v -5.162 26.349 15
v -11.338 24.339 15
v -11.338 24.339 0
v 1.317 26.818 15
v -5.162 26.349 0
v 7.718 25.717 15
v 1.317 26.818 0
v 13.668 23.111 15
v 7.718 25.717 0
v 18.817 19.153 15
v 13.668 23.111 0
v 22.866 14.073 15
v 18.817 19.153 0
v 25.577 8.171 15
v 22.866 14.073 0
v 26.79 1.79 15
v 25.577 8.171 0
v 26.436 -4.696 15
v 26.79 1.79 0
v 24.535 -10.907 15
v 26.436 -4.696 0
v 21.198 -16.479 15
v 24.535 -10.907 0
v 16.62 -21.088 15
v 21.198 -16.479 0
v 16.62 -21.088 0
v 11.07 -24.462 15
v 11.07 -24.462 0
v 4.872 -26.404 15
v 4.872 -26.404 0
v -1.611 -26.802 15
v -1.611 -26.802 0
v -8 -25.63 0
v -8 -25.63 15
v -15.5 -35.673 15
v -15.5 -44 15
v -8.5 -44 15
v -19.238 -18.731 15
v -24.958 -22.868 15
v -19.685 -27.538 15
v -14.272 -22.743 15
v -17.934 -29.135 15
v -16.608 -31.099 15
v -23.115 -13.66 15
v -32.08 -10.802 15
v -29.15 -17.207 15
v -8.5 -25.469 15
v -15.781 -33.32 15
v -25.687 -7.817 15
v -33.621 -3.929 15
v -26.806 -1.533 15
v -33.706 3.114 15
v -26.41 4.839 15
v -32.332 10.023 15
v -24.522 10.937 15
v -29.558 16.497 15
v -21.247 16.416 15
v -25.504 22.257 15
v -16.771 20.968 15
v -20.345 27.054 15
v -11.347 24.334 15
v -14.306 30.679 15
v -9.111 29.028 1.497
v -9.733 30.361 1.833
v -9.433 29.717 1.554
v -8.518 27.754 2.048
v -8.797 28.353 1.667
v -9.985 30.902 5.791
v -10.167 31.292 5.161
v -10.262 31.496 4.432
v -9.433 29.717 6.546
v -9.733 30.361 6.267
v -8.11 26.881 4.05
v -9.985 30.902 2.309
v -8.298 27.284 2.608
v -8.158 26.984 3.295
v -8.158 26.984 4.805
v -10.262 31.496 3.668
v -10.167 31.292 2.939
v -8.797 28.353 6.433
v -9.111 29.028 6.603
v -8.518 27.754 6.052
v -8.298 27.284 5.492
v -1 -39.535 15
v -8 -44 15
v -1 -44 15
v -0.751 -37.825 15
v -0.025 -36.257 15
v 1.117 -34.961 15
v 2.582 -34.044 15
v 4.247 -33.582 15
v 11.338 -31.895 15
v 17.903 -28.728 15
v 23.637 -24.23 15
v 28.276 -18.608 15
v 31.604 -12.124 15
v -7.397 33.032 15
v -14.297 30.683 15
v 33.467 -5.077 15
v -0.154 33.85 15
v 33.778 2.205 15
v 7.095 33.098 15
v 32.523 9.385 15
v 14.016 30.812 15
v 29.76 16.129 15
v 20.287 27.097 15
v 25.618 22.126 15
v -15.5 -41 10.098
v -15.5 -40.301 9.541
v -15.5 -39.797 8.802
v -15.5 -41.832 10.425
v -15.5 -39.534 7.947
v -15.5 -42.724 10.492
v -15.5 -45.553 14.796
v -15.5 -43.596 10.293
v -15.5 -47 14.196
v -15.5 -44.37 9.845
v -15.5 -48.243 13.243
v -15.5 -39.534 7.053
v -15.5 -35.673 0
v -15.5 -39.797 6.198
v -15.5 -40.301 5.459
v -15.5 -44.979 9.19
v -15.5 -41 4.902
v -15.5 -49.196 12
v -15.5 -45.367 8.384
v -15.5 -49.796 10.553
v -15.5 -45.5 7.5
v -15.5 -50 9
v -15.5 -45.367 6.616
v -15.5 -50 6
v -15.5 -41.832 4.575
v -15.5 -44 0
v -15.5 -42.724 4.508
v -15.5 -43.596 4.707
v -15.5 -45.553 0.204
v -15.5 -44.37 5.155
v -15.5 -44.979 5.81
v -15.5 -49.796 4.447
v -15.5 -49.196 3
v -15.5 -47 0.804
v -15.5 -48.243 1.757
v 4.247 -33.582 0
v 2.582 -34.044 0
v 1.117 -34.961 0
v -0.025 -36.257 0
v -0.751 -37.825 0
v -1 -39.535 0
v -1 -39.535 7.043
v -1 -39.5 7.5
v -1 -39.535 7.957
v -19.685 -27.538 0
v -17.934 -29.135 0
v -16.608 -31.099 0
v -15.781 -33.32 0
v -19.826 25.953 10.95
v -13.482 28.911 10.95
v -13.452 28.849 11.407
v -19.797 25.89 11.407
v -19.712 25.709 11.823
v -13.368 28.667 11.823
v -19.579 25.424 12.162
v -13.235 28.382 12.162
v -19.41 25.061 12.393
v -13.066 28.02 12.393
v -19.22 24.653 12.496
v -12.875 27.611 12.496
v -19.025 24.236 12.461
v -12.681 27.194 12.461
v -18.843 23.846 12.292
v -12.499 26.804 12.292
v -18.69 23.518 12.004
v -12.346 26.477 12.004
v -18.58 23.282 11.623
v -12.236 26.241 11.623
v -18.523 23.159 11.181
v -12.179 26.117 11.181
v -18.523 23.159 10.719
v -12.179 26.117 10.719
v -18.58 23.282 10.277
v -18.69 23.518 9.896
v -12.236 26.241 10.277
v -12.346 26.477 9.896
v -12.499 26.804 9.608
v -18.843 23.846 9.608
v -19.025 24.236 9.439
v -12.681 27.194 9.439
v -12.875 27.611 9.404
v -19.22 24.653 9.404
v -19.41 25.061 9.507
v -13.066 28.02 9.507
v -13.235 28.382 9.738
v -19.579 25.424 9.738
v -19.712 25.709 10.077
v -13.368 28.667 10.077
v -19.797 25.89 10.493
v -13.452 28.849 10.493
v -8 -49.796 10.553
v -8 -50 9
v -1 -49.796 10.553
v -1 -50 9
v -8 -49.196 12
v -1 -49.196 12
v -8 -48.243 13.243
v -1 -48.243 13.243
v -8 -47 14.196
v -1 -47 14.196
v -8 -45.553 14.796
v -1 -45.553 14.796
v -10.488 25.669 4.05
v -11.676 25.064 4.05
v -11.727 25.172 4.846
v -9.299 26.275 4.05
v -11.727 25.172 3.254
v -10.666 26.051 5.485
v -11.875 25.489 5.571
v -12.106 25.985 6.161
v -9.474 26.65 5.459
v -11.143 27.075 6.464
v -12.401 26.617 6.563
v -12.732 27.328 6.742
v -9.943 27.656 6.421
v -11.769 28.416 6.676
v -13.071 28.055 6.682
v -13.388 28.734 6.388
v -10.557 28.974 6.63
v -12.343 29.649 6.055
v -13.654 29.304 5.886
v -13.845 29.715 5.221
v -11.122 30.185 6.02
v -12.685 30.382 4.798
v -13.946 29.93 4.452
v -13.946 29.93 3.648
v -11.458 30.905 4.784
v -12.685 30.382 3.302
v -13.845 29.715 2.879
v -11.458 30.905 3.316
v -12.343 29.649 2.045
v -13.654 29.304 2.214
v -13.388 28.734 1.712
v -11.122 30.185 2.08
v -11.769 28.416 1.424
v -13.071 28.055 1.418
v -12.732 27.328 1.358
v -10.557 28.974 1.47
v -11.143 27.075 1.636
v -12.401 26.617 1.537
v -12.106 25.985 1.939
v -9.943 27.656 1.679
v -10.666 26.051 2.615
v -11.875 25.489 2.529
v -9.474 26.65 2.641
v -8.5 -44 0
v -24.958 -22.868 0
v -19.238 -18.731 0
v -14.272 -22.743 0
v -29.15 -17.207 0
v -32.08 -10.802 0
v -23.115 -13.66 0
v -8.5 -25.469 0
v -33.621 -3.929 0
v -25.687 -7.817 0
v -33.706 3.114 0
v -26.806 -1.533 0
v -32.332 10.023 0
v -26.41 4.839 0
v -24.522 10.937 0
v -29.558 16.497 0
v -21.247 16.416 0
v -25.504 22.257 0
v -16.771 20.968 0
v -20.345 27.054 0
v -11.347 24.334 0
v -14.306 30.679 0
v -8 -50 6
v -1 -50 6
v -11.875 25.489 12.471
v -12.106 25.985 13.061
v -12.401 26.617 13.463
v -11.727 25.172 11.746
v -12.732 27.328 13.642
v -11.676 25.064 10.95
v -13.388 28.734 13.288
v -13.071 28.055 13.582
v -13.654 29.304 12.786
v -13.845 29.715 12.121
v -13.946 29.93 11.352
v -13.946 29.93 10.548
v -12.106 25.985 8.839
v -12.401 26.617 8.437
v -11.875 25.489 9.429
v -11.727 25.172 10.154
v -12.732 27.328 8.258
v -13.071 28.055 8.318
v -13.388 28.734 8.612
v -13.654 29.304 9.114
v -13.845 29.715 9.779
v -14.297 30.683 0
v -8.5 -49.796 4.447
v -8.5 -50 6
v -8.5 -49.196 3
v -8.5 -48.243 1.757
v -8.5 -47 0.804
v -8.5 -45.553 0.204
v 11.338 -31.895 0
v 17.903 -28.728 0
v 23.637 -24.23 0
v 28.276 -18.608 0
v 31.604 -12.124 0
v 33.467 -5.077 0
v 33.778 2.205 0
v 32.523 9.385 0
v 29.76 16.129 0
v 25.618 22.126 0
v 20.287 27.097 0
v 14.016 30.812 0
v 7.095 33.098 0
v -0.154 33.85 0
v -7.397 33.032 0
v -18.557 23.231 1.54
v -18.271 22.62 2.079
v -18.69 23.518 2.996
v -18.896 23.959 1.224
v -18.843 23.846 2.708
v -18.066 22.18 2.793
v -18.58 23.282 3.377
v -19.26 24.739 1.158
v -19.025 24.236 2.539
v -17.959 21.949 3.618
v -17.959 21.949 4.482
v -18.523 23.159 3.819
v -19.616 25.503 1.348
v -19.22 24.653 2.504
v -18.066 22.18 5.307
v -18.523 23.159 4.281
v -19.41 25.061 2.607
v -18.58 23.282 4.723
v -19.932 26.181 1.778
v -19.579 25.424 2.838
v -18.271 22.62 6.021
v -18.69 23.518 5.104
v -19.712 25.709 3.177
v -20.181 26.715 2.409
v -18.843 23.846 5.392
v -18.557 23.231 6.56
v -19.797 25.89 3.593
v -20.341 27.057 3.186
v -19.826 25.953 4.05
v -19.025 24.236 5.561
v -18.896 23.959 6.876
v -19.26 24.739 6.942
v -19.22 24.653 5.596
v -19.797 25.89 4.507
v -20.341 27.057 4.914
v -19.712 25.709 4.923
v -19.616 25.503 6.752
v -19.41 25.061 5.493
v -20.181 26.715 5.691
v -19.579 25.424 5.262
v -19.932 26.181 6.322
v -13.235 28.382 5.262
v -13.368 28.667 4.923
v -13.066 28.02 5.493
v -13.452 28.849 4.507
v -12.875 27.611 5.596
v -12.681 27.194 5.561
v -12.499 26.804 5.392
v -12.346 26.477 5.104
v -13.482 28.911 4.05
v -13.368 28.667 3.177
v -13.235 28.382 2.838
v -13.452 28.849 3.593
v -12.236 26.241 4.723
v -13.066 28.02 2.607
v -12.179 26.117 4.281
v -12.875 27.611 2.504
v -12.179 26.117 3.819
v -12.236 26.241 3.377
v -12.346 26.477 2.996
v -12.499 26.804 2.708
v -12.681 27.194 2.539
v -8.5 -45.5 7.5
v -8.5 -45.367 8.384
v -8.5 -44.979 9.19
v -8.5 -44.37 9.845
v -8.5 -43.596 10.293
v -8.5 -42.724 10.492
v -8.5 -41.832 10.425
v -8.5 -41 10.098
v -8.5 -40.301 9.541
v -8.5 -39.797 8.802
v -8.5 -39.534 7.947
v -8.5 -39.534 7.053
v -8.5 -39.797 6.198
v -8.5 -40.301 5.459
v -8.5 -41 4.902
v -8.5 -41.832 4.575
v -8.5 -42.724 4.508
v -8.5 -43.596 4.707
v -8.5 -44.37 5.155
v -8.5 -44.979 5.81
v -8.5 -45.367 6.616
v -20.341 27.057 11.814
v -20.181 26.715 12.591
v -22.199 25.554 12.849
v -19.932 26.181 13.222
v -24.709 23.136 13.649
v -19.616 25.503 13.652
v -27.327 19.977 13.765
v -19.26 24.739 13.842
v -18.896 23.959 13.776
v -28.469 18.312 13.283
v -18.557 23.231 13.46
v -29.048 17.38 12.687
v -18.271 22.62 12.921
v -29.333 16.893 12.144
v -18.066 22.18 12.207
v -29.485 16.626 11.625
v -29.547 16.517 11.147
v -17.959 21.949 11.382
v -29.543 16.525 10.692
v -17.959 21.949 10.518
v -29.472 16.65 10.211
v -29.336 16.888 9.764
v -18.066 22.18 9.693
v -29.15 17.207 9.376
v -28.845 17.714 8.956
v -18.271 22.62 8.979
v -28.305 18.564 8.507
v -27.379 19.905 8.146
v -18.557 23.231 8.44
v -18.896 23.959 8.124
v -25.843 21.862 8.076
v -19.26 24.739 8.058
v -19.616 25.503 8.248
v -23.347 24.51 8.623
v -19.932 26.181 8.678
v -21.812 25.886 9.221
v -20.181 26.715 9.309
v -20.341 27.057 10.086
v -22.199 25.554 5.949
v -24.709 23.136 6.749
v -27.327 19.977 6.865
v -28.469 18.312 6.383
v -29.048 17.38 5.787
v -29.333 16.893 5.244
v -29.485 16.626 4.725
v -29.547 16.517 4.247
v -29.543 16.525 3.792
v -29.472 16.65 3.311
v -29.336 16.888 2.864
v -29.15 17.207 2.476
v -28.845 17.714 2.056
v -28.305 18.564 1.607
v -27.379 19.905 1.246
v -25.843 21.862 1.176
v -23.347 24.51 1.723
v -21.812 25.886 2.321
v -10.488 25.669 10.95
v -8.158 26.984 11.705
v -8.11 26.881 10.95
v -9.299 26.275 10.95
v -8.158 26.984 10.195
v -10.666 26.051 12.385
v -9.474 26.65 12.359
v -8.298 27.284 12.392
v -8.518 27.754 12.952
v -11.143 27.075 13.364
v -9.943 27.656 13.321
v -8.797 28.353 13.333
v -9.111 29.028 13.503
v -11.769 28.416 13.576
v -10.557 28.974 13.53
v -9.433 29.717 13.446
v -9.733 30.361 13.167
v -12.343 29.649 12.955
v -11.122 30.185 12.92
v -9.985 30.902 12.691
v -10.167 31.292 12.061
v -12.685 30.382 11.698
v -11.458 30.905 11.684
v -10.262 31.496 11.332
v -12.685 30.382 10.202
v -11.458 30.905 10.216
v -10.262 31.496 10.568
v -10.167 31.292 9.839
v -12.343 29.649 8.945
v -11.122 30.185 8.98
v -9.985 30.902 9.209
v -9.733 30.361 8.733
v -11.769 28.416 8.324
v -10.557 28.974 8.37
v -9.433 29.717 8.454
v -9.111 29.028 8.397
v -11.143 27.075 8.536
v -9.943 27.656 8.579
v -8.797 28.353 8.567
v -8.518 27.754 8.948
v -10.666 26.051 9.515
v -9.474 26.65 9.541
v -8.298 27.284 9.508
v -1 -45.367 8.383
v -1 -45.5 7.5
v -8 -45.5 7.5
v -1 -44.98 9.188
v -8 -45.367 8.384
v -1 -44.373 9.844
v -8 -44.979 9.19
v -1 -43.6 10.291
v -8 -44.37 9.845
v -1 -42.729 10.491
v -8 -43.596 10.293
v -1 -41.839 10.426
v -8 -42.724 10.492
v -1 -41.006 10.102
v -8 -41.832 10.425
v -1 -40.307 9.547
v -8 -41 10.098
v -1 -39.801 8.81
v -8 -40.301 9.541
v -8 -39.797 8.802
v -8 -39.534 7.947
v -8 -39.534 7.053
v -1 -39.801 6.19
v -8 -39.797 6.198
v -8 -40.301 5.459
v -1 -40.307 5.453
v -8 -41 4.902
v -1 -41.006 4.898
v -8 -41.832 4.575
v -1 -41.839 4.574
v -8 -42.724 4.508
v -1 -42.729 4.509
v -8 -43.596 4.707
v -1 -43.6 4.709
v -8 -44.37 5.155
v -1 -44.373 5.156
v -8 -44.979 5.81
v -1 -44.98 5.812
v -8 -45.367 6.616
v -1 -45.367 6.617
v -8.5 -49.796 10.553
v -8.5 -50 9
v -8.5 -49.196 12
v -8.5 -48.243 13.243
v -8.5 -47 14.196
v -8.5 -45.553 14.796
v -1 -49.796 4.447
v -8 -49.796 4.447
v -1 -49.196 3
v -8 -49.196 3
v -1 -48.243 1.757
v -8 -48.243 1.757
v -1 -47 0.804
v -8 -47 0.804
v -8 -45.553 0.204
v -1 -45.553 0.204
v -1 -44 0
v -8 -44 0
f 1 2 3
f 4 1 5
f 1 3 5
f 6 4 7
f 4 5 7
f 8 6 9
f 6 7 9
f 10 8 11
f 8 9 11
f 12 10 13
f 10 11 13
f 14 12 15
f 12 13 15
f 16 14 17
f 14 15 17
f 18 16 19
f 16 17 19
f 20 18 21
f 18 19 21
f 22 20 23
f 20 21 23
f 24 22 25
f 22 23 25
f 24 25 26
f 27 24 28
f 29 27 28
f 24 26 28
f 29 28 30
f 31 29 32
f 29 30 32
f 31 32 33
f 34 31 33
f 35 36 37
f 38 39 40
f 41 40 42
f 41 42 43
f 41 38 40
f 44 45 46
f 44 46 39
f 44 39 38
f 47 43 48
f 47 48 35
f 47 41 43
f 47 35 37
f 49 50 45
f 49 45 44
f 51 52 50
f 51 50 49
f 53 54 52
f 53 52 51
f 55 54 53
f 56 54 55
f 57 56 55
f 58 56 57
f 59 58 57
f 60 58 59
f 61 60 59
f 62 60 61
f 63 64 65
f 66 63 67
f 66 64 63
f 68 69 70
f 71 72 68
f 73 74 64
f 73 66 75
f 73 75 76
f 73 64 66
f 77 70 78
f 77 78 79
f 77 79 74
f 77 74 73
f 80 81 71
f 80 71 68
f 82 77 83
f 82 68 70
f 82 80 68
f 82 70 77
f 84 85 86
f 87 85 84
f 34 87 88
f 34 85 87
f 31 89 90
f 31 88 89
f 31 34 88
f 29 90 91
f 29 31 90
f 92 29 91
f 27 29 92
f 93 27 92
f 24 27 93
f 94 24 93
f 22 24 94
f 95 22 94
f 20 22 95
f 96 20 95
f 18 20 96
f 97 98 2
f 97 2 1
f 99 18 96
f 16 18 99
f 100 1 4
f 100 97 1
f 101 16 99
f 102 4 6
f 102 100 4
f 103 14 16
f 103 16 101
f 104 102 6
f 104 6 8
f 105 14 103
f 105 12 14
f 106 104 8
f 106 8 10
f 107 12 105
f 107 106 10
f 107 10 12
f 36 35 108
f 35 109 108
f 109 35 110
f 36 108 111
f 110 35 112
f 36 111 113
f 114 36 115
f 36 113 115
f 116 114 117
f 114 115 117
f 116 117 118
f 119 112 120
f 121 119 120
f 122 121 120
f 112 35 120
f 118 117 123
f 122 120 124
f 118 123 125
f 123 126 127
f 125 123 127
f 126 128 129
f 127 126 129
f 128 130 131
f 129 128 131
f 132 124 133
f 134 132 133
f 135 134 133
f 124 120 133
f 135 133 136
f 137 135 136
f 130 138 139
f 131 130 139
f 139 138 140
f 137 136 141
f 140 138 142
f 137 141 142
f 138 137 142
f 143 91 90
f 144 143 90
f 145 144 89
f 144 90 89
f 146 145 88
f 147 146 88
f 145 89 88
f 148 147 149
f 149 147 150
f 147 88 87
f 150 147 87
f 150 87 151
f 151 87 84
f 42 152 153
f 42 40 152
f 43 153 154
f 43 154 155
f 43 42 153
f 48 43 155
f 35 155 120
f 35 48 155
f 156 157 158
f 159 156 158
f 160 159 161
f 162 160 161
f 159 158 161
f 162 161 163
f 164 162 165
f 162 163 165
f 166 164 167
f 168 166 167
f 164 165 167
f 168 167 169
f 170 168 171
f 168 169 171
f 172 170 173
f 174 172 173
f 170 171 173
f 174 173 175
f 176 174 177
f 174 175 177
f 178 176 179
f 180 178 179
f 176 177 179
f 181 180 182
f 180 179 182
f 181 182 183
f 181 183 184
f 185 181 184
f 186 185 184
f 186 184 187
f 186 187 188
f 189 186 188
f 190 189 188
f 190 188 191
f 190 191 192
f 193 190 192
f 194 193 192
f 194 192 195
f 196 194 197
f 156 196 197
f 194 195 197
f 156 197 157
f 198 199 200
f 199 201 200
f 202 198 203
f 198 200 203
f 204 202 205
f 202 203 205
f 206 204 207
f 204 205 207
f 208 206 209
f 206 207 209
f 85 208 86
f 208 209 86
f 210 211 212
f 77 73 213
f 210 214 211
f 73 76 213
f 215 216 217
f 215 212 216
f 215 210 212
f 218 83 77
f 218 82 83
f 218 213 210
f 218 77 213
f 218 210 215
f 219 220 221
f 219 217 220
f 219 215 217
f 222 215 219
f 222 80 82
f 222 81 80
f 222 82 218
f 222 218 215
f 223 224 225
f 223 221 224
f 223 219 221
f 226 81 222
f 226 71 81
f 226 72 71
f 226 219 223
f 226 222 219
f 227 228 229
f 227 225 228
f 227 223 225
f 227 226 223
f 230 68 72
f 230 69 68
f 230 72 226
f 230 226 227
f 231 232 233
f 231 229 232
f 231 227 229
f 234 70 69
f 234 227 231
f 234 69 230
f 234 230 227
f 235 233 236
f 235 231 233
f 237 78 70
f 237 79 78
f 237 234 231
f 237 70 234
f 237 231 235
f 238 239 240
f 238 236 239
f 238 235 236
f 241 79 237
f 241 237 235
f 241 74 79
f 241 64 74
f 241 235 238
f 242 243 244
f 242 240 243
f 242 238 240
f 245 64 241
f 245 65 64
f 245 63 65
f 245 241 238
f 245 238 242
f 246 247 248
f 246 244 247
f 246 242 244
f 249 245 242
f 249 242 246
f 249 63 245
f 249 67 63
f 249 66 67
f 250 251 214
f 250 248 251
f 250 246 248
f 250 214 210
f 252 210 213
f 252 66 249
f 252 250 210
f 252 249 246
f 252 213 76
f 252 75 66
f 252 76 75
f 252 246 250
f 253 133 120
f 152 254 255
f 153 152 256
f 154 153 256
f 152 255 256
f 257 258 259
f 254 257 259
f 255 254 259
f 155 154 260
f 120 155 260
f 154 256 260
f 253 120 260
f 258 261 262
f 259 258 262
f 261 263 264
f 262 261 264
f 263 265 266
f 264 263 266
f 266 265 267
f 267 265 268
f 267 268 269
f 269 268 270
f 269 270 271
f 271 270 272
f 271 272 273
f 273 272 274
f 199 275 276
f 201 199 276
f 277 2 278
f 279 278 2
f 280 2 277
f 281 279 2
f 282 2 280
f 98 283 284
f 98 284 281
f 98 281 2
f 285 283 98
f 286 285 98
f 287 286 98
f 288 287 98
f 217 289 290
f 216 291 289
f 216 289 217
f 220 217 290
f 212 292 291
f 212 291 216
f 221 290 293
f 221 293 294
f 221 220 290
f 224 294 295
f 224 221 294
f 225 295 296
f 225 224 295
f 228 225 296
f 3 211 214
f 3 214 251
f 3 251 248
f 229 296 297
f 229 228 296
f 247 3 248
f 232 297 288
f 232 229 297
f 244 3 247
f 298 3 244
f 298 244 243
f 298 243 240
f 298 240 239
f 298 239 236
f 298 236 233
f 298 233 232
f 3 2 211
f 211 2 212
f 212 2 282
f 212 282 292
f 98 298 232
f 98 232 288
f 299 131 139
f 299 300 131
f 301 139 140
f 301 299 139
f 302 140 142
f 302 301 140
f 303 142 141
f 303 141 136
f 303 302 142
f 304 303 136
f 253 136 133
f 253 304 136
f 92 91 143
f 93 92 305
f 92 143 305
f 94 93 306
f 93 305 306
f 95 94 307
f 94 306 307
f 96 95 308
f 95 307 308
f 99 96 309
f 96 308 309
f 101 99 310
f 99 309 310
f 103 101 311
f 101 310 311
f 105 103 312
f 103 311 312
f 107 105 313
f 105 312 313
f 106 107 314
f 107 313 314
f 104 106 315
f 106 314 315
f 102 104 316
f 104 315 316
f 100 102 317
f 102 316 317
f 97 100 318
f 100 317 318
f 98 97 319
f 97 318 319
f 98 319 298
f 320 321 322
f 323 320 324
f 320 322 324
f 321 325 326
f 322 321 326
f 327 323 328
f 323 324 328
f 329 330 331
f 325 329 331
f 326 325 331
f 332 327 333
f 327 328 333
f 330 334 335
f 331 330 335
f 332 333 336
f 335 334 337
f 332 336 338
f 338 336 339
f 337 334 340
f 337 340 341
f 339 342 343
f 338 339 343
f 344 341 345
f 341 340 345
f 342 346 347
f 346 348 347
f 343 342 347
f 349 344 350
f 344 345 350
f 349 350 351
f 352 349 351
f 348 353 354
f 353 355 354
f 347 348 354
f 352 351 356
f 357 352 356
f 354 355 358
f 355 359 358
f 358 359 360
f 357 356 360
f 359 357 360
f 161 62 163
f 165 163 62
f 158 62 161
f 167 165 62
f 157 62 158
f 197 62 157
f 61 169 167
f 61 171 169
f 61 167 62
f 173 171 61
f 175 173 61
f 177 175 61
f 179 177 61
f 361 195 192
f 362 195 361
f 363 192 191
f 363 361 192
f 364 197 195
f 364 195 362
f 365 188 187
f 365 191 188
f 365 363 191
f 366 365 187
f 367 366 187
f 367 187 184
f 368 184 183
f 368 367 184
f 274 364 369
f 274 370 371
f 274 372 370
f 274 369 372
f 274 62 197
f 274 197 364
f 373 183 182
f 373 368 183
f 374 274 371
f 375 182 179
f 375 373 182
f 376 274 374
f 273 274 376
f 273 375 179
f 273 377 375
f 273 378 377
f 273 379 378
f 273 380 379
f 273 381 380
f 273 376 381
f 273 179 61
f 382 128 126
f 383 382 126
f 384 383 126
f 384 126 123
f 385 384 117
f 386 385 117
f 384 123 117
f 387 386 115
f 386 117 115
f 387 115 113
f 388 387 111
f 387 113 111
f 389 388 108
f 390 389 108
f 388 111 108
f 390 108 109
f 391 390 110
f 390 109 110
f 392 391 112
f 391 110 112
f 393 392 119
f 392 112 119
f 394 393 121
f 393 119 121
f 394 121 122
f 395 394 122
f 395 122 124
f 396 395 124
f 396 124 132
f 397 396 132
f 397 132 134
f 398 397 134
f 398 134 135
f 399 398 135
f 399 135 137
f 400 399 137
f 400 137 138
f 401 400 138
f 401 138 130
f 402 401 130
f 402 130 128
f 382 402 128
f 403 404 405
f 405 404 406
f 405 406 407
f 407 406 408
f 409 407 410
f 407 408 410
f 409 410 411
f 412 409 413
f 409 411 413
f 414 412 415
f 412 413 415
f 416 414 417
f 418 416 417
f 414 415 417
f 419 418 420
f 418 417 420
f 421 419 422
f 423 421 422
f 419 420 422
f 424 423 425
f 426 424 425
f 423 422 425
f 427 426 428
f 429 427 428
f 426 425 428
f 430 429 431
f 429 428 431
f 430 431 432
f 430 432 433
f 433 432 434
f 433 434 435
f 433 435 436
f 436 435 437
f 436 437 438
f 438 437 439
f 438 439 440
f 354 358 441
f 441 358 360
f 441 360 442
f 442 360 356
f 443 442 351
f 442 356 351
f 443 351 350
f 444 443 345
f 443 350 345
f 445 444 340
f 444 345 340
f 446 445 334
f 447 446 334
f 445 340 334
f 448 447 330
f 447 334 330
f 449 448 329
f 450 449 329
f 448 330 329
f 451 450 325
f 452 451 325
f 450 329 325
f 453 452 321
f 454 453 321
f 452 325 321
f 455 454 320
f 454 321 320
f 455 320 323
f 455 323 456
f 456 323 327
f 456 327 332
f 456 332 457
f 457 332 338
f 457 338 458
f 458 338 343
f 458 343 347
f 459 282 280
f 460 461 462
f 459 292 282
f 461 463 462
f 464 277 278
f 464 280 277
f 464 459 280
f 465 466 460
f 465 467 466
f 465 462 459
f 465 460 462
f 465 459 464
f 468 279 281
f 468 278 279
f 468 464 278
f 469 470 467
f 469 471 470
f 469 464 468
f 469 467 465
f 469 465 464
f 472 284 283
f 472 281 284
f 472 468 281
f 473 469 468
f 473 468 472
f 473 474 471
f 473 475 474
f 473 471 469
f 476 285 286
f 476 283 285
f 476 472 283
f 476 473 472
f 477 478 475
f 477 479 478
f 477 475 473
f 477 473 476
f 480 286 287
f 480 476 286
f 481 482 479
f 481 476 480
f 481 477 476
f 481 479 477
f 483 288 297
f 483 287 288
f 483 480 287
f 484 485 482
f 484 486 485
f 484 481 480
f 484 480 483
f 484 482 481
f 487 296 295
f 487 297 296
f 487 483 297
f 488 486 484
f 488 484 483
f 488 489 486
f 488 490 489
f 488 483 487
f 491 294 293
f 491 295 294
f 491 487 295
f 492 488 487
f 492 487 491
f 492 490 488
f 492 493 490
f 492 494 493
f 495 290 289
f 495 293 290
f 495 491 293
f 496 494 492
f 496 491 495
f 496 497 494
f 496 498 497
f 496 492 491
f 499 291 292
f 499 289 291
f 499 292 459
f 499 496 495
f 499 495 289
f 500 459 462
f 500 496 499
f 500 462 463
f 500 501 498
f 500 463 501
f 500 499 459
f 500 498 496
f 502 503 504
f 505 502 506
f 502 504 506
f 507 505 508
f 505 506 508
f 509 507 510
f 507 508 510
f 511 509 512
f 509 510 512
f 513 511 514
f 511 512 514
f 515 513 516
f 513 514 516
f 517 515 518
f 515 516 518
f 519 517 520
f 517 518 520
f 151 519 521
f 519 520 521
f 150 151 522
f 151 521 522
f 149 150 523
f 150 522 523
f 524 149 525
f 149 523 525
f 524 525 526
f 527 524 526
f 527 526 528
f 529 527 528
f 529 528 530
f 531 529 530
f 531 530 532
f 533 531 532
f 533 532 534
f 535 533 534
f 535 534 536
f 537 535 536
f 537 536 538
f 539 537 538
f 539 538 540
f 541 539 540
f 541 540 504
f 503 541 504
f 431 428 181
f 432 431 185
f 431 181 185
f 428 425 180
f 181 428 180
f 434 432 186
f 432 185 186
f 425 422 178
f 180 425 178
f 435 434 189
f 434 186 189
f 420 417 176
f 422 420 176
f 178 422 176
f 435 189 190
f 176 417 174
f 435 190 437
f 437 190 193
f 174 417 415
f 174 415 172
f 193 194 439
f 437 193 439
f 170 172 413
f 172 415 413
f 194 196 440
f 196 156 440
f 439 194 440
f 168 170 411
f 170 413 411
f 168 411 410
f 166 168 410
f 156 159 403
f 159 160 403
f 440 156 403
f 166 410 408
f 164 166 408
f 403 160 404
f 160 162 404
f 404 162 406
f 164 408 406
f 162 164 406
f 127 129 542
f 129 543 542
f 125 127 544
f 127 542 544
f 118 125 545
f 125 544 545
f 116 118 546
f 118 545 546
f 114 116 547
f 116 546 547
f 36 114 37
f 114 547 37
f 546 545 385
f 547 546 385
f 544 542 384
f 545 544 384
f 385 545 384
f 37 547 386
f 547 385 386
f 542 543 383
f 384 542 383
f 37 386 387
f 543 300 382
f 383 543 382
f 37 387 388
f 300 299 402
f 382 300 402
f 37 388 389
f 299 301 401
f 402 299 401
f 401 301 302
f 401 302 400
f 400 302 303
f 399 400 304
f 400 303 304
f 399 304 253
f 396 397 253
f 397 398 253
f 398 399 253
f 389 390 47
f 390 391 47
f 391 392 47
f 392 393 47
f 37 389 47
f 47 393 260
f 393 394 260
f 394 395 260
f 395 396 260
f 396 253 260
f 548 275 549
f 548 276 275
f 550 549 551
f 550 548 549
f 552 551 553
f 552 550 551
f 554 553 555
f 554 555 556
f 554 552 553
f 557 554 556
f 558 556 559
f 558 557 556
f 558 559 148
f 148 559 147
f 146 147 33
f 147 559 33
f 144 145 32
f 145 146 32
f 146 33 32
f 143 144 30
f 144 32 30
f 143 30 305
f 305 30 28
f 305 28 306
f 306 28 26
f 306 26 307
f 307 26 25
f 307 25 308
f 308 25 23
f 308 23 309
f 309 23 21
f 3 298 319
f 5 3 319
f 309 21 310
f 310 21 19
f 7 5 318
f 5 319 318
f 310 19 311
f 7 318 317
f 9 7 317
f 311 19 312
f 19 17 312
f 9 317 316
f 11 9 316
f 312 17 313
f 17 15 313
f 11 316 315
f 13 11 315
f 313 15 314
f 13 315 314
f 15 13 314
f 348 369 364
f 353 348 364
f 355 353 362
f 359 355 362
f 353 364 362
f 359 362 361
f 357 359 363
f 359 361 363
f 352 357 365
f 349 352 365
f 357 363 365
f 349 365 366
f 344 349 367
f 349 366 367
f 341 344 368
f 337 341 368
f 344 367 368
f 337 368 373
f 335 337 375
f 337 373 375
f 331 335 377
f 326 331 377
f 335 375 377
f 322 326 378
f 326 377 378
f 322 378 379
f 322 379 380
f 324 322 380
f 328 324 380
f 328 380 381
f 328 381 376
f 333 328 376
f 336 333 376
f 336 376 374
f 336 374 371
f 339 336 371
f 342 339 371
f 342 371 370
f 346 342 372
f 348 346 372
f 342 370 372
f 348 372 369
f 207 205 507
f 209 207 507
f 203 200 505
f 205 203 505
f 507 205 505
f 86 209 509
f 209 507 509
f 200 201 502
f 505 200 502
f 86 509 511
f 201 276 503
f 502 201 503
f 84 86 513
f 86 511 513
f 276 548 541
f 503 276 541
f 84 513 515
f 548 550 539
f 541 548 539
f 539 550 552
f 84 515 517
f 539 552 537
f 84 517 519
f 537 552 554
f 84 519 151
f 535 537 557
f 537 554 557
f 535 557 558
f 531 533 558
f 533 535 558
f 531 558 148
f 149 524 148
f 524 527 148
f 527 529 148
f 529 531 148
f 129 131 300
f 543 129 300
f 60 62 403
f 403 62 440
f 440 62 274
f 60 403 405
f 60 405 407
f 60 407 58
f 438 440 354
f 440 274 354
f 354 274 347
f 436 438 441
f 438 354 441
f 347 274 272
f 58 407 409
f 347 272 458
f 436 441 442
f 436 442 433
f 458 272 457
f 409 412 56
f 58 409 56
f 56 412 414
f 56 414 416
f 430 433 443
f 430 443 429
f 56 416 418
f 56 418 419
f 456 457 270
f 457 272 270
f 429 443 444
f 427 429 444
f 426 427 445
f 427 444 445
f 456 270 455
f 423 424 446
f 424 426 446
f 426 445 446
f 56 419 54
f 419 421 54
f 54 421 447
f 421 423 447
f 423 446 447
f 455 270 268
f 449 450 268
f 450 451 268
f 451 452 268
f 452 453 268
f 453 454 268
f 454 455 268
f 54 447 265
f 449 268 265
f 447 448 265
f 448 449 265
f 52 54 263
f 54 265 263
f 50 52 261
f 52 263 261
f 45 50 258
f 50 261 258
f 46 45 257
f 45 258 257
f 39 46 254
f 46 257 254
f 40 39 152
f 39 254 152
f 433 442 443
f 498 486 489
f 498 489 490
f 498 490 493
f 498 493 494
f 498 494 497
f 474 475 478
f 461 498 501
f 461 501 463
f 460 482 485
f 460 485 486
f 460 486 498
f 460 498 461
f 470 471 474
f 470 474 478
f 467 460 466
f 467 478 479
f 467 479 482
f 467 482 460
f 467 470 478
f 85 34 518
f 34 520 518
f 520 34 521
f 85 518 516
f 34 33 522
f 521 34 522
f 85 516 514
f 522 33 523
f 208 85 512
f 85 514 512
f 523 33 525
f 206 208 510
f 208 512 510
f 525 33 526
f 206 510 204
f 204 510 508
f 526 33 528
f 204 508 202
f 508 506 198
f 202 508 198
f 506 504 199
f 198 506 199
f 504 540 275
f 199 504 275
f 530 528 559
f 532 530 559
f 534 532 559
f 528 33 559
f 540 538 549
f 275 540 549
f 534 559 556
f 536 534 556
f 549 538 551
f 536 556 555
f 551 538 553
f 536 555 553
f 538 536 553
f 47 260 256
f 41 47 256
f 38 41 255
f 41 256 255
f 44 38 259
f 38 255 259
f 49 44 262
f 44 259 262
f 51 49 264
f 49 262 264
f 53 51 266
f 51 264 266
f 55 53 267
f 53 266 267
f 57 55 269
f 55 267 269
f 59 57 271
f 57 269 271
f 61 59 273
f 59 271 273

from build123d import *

# Parameters (mm, degrees)
F1_DEPTH       = 15
F2_R           = 6
F3_R           = 10
F4_R           = 6
F5_R           = 3
F6_DEPTH       = 49.351
F8_DEPTH       = 15.0010001
F9_R           = 1.55
F10_DEPTH      = 7
F10_DEPTH_BACK = 3.8
F11_R          = 2.7
F12_DEPTH      = 4
F12_TAPER      = 2
F13_R          = 2.9
F14_DEPTH      = 44.8104316782


with BuildPart() as f1:
    # F0 (on Top) → F1 (new body)
    with BuildSketch(Plane.XY):
        with BuildLine():
            Line((-1, -50), (-1, -33.835225727))
            ThreePointArc((-1, -33.835225727), (8.4595546822, 32.7758819039), (-15.5, -30.0927316806))
            Line((-15.5, -30.0927316806), (-15.5, -50))
            Line((-15.5, -50), (-8.5, -50))
            Line((-8.5, -50), (-8.5, -25.4690498449))
            ThreePointArc((-8.5, -25.4690498449), (8.2503949294, 25.5509977009), (-8, -25.6304994099))
            Line((-8, -25.6304994099), (-8, -50))
            Line((-8, -50), (-1, -50))
        make_face()
    extrude(amount=F1_DEPTH)

    # F2
    f2_edges = [f1.edges().sort_by_distance(p)[0] for p in [
        (-12, -50, 15),
        (-4.5, -50, 15),
        (-12, -50, 0),
        (-4.5, -50, 0),
    ]]
    fillet(f2_edges, radius=F2_R)

    # F3
    f3_edges = [f1.edges().sort_by_distance(p)[0] for p in [
        (-15.5, -30.092732, 7.5),
    ]]
    fillet(f3_edges, radius=F3_R)

    # F4
    f4_edges = [f1.edges().sort_by_distance(p)[0] for p in [
        (-1, -33.835226, 7.5),
    ]]
    fillet(f4_edges, radius=F4_R)

    # F5 (on face) → F6 (cut, through all)
    with BuildSketch(Plane(origin=(-15.5, 0, 0), x_dir=(0, -1, 0), z_dir=(-1, 0, 0))):
        with Locations((42.5, 7.5)):
            Circle(F5_R)
    extrude(amount=-F6_DEPTH, mode=Mode.SUBTRACT)

    # F7 (on Top) → F8 (cut, through all)
    with BuildSketch(Plane.XY):
        Polygon((-15.5682038442, 33.3861208837), (0, 0), (0.0066230902, 0.0094587531), (-15.561580754, 33.3955796368), align=None)
    extrude(amount=F8_DEPTH, mode=Mode.SUBTRACT)

    # F9 (on face) → F10 (cut, two sides)
    with BuildSketch(Plane(origin=(0, 0, 0), x_dir=(-0.4226182617, 0.906307787, 0), z_dir=(0.906307787, 0.4226182617, 0))) as f10_sk:
        with Locations((30.35, 10.95)):
            Circle(F9_R)
        with Locations((30.35, 4.05)):
            Circle(F9_R)
    extrude(amount=-F10_DEPTH, mode=Mode.SUBTRACT)
    extrude(f10_sk.sketch, amount=F10_DEPTH_BACK, mode=Mode.SUBTRACT)

    # F11 (on face) → F12 (cut)
    with BuildSketch(Plane(origin=(0.0090630779, 0.0042261826, 0), x_dir=(0.4226182617, -0.906307787, 0), z_dir=(-0.906307787, -0.4226182617, 0))):
        with Locations((-30.35, 10.95)):
            Circle(F11_R)
        with Locations((-30.35, 4.05)):
            Circle(F11_R)
    extrude(amount=-F12_DEPTH, taper=F12_TAPER, mode=Mode.SUBTRACT)

    # F13 (on face) → F14 (cut, through all)
    with BuildSketch(Plane(origin=(-6.3441545093, -2.9583278322, 0), x_dir=(-0.4226182617, 0.906307787, 0), z_dir=(0.906307787, 0.4226182617, 0))):
        with Locations((30.35, 10.95)):
            Circle(F13_R)
        with Locations((30.35, 4.05)):
            Circle(F13_R)
    extrude(amount=-F14_DEPTH, mode=Mode.SUBTRACT)


solid = f1.part
